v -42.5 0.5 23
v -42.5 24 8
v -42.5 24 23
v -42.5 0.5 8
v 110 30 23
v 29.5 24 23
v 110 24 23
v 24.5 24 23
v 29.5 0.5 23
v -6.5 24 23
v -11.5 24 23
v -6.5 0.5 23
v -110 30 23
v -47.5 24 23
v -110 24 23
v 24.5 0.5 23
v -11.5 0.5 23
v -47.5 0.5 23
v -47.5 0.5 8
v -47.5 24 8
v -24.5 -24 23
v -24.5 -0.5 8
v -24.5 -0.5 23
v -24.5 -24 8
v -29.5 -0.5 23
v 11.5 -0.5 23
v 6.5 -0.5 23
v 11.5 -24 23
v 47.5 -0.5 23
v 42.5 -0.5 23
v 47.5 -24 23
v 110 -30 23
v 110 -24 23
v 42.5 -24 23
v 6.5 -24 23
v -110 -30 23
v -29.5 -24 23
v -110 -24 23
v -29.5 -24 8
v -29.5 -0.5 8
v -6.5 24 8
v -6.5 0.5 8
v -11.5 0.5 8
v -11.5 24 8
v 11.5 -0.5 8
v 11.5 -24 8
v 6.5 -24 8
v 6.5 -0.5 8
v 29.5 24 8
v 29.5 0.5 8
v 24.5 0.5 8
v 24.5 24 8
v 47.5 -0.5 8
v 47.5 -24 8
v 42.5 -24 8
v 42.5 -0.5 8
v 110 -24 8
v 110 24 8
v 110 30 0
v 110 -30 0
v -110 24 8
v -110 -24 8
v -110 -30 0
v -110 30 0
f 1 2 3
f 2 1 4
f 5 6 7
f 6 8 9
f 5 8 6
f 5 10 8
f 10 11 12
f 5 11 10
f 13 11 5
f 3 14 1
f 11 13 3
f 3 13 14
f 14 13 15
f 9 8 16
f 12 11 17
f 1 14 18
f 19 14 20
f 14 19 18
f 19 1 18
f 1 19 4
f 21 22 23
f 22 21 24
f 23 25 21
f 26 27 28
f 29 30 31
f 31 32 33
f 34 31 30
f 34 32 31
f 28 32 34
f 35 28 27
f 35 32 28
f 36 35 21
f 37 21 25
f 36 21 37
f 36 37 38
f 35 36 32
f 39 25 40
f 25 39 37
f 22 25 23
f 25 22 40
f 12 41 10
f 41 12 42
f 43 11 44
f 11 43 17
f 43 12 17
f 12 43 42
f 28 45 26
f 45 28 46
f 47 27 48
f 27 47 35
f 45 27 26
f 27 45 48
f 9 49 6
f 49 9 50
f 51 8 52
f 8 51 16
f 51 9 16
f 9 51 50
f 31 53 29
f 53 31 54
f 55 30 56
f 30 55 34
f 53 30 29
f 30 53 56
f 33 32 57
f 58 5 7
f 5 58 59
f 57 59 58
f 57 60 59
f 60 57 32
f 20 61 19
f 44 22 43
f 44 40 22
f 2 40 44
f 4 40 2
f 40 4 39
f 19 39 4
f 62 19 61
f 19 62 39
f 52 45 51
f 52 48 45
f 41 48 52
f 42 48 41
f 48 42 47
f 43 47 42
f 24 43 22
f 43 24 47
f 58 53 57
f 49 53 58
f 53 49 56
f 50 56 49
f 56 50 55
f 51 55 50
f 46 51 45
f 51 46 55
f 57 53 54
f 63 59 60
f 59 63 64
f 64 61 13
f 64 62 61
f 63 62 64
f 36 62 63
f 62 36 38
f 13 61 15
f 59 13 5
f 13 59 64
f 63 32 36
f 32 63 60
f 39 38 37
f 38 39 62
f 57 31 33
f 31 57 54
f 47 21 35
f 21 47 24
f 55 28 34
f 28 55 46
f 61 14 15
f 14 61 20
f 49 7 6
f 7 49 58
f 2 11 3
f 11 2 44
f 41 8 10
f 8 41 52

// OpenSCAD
$fn = 32;

// ----------------------------------------------------------------------
// Rib frame 220 x 60 x 23
// 6 ribs at 18 mm pitch, staggered
// ----------------------------------------------------------------------

// --- parameters (mm) ---
frame = [220, 60, 8];  // base plate size (x, y, z)
rail_w = 6;            // side rail width
ribs = 6;              // number of ribs
rib_t = 5;             // rib thickness
rib_h = 15;            // rib height above the base plate
pitch = 18;            // pitch between rib centres

// --- derived feature positions (mm) ---
span = (ribs - 1) * pitch;          // = 90   distance between the outer ribs
origin_x = -span / 2;               // = -45   X of the first rib
rib_len = frame[1] / 2 - rail_w + 0.5;  // = 24.5   length of a staggered rib
rib_y = 0.5 + rib_len / 2;          // = 12.75   Y of a staggered rib centre
row_offset = 2 * rib_y;             // = 25.5   distance between the two rows
feature_centers = [
  [origin_x + 0 * pitch, rib_y],
  [origin_x + 1 * pitch, -rib_y],
  [origin_x + 2 * pitch, rib_y],
  [origin_x + 3 * pitch, -rib_y],
  [origin_x + 4 * pitch, rib_y],
  [origin_x + 5 * pitch, -rib_y]
];   // rib centre line, drives the rib loop

// base plate, two side rails, then the ribs read straight off feature_centers
union() {
  translate([-frame[0] / 2, -frame[1] / 2, 0]) cube(frame);
  translate([-frame[0] / 2, -frame[1] / 2, 0]) cube([frame[0], rail_w, frame[2] + rib_h]);
  translate([-frame[0] / 2, frame[1] / 2 - rail_w, 0]) cube([frame[0], rail_w, frame[2] + rib_h]);
  for (centre = feature_centers)
    translate([centre[0] - rib_t / 2, centre[1] - rib_len / 2, frame[2] - 1])
      cube([rib_t, rib_len, rib_h + 1]);
}
